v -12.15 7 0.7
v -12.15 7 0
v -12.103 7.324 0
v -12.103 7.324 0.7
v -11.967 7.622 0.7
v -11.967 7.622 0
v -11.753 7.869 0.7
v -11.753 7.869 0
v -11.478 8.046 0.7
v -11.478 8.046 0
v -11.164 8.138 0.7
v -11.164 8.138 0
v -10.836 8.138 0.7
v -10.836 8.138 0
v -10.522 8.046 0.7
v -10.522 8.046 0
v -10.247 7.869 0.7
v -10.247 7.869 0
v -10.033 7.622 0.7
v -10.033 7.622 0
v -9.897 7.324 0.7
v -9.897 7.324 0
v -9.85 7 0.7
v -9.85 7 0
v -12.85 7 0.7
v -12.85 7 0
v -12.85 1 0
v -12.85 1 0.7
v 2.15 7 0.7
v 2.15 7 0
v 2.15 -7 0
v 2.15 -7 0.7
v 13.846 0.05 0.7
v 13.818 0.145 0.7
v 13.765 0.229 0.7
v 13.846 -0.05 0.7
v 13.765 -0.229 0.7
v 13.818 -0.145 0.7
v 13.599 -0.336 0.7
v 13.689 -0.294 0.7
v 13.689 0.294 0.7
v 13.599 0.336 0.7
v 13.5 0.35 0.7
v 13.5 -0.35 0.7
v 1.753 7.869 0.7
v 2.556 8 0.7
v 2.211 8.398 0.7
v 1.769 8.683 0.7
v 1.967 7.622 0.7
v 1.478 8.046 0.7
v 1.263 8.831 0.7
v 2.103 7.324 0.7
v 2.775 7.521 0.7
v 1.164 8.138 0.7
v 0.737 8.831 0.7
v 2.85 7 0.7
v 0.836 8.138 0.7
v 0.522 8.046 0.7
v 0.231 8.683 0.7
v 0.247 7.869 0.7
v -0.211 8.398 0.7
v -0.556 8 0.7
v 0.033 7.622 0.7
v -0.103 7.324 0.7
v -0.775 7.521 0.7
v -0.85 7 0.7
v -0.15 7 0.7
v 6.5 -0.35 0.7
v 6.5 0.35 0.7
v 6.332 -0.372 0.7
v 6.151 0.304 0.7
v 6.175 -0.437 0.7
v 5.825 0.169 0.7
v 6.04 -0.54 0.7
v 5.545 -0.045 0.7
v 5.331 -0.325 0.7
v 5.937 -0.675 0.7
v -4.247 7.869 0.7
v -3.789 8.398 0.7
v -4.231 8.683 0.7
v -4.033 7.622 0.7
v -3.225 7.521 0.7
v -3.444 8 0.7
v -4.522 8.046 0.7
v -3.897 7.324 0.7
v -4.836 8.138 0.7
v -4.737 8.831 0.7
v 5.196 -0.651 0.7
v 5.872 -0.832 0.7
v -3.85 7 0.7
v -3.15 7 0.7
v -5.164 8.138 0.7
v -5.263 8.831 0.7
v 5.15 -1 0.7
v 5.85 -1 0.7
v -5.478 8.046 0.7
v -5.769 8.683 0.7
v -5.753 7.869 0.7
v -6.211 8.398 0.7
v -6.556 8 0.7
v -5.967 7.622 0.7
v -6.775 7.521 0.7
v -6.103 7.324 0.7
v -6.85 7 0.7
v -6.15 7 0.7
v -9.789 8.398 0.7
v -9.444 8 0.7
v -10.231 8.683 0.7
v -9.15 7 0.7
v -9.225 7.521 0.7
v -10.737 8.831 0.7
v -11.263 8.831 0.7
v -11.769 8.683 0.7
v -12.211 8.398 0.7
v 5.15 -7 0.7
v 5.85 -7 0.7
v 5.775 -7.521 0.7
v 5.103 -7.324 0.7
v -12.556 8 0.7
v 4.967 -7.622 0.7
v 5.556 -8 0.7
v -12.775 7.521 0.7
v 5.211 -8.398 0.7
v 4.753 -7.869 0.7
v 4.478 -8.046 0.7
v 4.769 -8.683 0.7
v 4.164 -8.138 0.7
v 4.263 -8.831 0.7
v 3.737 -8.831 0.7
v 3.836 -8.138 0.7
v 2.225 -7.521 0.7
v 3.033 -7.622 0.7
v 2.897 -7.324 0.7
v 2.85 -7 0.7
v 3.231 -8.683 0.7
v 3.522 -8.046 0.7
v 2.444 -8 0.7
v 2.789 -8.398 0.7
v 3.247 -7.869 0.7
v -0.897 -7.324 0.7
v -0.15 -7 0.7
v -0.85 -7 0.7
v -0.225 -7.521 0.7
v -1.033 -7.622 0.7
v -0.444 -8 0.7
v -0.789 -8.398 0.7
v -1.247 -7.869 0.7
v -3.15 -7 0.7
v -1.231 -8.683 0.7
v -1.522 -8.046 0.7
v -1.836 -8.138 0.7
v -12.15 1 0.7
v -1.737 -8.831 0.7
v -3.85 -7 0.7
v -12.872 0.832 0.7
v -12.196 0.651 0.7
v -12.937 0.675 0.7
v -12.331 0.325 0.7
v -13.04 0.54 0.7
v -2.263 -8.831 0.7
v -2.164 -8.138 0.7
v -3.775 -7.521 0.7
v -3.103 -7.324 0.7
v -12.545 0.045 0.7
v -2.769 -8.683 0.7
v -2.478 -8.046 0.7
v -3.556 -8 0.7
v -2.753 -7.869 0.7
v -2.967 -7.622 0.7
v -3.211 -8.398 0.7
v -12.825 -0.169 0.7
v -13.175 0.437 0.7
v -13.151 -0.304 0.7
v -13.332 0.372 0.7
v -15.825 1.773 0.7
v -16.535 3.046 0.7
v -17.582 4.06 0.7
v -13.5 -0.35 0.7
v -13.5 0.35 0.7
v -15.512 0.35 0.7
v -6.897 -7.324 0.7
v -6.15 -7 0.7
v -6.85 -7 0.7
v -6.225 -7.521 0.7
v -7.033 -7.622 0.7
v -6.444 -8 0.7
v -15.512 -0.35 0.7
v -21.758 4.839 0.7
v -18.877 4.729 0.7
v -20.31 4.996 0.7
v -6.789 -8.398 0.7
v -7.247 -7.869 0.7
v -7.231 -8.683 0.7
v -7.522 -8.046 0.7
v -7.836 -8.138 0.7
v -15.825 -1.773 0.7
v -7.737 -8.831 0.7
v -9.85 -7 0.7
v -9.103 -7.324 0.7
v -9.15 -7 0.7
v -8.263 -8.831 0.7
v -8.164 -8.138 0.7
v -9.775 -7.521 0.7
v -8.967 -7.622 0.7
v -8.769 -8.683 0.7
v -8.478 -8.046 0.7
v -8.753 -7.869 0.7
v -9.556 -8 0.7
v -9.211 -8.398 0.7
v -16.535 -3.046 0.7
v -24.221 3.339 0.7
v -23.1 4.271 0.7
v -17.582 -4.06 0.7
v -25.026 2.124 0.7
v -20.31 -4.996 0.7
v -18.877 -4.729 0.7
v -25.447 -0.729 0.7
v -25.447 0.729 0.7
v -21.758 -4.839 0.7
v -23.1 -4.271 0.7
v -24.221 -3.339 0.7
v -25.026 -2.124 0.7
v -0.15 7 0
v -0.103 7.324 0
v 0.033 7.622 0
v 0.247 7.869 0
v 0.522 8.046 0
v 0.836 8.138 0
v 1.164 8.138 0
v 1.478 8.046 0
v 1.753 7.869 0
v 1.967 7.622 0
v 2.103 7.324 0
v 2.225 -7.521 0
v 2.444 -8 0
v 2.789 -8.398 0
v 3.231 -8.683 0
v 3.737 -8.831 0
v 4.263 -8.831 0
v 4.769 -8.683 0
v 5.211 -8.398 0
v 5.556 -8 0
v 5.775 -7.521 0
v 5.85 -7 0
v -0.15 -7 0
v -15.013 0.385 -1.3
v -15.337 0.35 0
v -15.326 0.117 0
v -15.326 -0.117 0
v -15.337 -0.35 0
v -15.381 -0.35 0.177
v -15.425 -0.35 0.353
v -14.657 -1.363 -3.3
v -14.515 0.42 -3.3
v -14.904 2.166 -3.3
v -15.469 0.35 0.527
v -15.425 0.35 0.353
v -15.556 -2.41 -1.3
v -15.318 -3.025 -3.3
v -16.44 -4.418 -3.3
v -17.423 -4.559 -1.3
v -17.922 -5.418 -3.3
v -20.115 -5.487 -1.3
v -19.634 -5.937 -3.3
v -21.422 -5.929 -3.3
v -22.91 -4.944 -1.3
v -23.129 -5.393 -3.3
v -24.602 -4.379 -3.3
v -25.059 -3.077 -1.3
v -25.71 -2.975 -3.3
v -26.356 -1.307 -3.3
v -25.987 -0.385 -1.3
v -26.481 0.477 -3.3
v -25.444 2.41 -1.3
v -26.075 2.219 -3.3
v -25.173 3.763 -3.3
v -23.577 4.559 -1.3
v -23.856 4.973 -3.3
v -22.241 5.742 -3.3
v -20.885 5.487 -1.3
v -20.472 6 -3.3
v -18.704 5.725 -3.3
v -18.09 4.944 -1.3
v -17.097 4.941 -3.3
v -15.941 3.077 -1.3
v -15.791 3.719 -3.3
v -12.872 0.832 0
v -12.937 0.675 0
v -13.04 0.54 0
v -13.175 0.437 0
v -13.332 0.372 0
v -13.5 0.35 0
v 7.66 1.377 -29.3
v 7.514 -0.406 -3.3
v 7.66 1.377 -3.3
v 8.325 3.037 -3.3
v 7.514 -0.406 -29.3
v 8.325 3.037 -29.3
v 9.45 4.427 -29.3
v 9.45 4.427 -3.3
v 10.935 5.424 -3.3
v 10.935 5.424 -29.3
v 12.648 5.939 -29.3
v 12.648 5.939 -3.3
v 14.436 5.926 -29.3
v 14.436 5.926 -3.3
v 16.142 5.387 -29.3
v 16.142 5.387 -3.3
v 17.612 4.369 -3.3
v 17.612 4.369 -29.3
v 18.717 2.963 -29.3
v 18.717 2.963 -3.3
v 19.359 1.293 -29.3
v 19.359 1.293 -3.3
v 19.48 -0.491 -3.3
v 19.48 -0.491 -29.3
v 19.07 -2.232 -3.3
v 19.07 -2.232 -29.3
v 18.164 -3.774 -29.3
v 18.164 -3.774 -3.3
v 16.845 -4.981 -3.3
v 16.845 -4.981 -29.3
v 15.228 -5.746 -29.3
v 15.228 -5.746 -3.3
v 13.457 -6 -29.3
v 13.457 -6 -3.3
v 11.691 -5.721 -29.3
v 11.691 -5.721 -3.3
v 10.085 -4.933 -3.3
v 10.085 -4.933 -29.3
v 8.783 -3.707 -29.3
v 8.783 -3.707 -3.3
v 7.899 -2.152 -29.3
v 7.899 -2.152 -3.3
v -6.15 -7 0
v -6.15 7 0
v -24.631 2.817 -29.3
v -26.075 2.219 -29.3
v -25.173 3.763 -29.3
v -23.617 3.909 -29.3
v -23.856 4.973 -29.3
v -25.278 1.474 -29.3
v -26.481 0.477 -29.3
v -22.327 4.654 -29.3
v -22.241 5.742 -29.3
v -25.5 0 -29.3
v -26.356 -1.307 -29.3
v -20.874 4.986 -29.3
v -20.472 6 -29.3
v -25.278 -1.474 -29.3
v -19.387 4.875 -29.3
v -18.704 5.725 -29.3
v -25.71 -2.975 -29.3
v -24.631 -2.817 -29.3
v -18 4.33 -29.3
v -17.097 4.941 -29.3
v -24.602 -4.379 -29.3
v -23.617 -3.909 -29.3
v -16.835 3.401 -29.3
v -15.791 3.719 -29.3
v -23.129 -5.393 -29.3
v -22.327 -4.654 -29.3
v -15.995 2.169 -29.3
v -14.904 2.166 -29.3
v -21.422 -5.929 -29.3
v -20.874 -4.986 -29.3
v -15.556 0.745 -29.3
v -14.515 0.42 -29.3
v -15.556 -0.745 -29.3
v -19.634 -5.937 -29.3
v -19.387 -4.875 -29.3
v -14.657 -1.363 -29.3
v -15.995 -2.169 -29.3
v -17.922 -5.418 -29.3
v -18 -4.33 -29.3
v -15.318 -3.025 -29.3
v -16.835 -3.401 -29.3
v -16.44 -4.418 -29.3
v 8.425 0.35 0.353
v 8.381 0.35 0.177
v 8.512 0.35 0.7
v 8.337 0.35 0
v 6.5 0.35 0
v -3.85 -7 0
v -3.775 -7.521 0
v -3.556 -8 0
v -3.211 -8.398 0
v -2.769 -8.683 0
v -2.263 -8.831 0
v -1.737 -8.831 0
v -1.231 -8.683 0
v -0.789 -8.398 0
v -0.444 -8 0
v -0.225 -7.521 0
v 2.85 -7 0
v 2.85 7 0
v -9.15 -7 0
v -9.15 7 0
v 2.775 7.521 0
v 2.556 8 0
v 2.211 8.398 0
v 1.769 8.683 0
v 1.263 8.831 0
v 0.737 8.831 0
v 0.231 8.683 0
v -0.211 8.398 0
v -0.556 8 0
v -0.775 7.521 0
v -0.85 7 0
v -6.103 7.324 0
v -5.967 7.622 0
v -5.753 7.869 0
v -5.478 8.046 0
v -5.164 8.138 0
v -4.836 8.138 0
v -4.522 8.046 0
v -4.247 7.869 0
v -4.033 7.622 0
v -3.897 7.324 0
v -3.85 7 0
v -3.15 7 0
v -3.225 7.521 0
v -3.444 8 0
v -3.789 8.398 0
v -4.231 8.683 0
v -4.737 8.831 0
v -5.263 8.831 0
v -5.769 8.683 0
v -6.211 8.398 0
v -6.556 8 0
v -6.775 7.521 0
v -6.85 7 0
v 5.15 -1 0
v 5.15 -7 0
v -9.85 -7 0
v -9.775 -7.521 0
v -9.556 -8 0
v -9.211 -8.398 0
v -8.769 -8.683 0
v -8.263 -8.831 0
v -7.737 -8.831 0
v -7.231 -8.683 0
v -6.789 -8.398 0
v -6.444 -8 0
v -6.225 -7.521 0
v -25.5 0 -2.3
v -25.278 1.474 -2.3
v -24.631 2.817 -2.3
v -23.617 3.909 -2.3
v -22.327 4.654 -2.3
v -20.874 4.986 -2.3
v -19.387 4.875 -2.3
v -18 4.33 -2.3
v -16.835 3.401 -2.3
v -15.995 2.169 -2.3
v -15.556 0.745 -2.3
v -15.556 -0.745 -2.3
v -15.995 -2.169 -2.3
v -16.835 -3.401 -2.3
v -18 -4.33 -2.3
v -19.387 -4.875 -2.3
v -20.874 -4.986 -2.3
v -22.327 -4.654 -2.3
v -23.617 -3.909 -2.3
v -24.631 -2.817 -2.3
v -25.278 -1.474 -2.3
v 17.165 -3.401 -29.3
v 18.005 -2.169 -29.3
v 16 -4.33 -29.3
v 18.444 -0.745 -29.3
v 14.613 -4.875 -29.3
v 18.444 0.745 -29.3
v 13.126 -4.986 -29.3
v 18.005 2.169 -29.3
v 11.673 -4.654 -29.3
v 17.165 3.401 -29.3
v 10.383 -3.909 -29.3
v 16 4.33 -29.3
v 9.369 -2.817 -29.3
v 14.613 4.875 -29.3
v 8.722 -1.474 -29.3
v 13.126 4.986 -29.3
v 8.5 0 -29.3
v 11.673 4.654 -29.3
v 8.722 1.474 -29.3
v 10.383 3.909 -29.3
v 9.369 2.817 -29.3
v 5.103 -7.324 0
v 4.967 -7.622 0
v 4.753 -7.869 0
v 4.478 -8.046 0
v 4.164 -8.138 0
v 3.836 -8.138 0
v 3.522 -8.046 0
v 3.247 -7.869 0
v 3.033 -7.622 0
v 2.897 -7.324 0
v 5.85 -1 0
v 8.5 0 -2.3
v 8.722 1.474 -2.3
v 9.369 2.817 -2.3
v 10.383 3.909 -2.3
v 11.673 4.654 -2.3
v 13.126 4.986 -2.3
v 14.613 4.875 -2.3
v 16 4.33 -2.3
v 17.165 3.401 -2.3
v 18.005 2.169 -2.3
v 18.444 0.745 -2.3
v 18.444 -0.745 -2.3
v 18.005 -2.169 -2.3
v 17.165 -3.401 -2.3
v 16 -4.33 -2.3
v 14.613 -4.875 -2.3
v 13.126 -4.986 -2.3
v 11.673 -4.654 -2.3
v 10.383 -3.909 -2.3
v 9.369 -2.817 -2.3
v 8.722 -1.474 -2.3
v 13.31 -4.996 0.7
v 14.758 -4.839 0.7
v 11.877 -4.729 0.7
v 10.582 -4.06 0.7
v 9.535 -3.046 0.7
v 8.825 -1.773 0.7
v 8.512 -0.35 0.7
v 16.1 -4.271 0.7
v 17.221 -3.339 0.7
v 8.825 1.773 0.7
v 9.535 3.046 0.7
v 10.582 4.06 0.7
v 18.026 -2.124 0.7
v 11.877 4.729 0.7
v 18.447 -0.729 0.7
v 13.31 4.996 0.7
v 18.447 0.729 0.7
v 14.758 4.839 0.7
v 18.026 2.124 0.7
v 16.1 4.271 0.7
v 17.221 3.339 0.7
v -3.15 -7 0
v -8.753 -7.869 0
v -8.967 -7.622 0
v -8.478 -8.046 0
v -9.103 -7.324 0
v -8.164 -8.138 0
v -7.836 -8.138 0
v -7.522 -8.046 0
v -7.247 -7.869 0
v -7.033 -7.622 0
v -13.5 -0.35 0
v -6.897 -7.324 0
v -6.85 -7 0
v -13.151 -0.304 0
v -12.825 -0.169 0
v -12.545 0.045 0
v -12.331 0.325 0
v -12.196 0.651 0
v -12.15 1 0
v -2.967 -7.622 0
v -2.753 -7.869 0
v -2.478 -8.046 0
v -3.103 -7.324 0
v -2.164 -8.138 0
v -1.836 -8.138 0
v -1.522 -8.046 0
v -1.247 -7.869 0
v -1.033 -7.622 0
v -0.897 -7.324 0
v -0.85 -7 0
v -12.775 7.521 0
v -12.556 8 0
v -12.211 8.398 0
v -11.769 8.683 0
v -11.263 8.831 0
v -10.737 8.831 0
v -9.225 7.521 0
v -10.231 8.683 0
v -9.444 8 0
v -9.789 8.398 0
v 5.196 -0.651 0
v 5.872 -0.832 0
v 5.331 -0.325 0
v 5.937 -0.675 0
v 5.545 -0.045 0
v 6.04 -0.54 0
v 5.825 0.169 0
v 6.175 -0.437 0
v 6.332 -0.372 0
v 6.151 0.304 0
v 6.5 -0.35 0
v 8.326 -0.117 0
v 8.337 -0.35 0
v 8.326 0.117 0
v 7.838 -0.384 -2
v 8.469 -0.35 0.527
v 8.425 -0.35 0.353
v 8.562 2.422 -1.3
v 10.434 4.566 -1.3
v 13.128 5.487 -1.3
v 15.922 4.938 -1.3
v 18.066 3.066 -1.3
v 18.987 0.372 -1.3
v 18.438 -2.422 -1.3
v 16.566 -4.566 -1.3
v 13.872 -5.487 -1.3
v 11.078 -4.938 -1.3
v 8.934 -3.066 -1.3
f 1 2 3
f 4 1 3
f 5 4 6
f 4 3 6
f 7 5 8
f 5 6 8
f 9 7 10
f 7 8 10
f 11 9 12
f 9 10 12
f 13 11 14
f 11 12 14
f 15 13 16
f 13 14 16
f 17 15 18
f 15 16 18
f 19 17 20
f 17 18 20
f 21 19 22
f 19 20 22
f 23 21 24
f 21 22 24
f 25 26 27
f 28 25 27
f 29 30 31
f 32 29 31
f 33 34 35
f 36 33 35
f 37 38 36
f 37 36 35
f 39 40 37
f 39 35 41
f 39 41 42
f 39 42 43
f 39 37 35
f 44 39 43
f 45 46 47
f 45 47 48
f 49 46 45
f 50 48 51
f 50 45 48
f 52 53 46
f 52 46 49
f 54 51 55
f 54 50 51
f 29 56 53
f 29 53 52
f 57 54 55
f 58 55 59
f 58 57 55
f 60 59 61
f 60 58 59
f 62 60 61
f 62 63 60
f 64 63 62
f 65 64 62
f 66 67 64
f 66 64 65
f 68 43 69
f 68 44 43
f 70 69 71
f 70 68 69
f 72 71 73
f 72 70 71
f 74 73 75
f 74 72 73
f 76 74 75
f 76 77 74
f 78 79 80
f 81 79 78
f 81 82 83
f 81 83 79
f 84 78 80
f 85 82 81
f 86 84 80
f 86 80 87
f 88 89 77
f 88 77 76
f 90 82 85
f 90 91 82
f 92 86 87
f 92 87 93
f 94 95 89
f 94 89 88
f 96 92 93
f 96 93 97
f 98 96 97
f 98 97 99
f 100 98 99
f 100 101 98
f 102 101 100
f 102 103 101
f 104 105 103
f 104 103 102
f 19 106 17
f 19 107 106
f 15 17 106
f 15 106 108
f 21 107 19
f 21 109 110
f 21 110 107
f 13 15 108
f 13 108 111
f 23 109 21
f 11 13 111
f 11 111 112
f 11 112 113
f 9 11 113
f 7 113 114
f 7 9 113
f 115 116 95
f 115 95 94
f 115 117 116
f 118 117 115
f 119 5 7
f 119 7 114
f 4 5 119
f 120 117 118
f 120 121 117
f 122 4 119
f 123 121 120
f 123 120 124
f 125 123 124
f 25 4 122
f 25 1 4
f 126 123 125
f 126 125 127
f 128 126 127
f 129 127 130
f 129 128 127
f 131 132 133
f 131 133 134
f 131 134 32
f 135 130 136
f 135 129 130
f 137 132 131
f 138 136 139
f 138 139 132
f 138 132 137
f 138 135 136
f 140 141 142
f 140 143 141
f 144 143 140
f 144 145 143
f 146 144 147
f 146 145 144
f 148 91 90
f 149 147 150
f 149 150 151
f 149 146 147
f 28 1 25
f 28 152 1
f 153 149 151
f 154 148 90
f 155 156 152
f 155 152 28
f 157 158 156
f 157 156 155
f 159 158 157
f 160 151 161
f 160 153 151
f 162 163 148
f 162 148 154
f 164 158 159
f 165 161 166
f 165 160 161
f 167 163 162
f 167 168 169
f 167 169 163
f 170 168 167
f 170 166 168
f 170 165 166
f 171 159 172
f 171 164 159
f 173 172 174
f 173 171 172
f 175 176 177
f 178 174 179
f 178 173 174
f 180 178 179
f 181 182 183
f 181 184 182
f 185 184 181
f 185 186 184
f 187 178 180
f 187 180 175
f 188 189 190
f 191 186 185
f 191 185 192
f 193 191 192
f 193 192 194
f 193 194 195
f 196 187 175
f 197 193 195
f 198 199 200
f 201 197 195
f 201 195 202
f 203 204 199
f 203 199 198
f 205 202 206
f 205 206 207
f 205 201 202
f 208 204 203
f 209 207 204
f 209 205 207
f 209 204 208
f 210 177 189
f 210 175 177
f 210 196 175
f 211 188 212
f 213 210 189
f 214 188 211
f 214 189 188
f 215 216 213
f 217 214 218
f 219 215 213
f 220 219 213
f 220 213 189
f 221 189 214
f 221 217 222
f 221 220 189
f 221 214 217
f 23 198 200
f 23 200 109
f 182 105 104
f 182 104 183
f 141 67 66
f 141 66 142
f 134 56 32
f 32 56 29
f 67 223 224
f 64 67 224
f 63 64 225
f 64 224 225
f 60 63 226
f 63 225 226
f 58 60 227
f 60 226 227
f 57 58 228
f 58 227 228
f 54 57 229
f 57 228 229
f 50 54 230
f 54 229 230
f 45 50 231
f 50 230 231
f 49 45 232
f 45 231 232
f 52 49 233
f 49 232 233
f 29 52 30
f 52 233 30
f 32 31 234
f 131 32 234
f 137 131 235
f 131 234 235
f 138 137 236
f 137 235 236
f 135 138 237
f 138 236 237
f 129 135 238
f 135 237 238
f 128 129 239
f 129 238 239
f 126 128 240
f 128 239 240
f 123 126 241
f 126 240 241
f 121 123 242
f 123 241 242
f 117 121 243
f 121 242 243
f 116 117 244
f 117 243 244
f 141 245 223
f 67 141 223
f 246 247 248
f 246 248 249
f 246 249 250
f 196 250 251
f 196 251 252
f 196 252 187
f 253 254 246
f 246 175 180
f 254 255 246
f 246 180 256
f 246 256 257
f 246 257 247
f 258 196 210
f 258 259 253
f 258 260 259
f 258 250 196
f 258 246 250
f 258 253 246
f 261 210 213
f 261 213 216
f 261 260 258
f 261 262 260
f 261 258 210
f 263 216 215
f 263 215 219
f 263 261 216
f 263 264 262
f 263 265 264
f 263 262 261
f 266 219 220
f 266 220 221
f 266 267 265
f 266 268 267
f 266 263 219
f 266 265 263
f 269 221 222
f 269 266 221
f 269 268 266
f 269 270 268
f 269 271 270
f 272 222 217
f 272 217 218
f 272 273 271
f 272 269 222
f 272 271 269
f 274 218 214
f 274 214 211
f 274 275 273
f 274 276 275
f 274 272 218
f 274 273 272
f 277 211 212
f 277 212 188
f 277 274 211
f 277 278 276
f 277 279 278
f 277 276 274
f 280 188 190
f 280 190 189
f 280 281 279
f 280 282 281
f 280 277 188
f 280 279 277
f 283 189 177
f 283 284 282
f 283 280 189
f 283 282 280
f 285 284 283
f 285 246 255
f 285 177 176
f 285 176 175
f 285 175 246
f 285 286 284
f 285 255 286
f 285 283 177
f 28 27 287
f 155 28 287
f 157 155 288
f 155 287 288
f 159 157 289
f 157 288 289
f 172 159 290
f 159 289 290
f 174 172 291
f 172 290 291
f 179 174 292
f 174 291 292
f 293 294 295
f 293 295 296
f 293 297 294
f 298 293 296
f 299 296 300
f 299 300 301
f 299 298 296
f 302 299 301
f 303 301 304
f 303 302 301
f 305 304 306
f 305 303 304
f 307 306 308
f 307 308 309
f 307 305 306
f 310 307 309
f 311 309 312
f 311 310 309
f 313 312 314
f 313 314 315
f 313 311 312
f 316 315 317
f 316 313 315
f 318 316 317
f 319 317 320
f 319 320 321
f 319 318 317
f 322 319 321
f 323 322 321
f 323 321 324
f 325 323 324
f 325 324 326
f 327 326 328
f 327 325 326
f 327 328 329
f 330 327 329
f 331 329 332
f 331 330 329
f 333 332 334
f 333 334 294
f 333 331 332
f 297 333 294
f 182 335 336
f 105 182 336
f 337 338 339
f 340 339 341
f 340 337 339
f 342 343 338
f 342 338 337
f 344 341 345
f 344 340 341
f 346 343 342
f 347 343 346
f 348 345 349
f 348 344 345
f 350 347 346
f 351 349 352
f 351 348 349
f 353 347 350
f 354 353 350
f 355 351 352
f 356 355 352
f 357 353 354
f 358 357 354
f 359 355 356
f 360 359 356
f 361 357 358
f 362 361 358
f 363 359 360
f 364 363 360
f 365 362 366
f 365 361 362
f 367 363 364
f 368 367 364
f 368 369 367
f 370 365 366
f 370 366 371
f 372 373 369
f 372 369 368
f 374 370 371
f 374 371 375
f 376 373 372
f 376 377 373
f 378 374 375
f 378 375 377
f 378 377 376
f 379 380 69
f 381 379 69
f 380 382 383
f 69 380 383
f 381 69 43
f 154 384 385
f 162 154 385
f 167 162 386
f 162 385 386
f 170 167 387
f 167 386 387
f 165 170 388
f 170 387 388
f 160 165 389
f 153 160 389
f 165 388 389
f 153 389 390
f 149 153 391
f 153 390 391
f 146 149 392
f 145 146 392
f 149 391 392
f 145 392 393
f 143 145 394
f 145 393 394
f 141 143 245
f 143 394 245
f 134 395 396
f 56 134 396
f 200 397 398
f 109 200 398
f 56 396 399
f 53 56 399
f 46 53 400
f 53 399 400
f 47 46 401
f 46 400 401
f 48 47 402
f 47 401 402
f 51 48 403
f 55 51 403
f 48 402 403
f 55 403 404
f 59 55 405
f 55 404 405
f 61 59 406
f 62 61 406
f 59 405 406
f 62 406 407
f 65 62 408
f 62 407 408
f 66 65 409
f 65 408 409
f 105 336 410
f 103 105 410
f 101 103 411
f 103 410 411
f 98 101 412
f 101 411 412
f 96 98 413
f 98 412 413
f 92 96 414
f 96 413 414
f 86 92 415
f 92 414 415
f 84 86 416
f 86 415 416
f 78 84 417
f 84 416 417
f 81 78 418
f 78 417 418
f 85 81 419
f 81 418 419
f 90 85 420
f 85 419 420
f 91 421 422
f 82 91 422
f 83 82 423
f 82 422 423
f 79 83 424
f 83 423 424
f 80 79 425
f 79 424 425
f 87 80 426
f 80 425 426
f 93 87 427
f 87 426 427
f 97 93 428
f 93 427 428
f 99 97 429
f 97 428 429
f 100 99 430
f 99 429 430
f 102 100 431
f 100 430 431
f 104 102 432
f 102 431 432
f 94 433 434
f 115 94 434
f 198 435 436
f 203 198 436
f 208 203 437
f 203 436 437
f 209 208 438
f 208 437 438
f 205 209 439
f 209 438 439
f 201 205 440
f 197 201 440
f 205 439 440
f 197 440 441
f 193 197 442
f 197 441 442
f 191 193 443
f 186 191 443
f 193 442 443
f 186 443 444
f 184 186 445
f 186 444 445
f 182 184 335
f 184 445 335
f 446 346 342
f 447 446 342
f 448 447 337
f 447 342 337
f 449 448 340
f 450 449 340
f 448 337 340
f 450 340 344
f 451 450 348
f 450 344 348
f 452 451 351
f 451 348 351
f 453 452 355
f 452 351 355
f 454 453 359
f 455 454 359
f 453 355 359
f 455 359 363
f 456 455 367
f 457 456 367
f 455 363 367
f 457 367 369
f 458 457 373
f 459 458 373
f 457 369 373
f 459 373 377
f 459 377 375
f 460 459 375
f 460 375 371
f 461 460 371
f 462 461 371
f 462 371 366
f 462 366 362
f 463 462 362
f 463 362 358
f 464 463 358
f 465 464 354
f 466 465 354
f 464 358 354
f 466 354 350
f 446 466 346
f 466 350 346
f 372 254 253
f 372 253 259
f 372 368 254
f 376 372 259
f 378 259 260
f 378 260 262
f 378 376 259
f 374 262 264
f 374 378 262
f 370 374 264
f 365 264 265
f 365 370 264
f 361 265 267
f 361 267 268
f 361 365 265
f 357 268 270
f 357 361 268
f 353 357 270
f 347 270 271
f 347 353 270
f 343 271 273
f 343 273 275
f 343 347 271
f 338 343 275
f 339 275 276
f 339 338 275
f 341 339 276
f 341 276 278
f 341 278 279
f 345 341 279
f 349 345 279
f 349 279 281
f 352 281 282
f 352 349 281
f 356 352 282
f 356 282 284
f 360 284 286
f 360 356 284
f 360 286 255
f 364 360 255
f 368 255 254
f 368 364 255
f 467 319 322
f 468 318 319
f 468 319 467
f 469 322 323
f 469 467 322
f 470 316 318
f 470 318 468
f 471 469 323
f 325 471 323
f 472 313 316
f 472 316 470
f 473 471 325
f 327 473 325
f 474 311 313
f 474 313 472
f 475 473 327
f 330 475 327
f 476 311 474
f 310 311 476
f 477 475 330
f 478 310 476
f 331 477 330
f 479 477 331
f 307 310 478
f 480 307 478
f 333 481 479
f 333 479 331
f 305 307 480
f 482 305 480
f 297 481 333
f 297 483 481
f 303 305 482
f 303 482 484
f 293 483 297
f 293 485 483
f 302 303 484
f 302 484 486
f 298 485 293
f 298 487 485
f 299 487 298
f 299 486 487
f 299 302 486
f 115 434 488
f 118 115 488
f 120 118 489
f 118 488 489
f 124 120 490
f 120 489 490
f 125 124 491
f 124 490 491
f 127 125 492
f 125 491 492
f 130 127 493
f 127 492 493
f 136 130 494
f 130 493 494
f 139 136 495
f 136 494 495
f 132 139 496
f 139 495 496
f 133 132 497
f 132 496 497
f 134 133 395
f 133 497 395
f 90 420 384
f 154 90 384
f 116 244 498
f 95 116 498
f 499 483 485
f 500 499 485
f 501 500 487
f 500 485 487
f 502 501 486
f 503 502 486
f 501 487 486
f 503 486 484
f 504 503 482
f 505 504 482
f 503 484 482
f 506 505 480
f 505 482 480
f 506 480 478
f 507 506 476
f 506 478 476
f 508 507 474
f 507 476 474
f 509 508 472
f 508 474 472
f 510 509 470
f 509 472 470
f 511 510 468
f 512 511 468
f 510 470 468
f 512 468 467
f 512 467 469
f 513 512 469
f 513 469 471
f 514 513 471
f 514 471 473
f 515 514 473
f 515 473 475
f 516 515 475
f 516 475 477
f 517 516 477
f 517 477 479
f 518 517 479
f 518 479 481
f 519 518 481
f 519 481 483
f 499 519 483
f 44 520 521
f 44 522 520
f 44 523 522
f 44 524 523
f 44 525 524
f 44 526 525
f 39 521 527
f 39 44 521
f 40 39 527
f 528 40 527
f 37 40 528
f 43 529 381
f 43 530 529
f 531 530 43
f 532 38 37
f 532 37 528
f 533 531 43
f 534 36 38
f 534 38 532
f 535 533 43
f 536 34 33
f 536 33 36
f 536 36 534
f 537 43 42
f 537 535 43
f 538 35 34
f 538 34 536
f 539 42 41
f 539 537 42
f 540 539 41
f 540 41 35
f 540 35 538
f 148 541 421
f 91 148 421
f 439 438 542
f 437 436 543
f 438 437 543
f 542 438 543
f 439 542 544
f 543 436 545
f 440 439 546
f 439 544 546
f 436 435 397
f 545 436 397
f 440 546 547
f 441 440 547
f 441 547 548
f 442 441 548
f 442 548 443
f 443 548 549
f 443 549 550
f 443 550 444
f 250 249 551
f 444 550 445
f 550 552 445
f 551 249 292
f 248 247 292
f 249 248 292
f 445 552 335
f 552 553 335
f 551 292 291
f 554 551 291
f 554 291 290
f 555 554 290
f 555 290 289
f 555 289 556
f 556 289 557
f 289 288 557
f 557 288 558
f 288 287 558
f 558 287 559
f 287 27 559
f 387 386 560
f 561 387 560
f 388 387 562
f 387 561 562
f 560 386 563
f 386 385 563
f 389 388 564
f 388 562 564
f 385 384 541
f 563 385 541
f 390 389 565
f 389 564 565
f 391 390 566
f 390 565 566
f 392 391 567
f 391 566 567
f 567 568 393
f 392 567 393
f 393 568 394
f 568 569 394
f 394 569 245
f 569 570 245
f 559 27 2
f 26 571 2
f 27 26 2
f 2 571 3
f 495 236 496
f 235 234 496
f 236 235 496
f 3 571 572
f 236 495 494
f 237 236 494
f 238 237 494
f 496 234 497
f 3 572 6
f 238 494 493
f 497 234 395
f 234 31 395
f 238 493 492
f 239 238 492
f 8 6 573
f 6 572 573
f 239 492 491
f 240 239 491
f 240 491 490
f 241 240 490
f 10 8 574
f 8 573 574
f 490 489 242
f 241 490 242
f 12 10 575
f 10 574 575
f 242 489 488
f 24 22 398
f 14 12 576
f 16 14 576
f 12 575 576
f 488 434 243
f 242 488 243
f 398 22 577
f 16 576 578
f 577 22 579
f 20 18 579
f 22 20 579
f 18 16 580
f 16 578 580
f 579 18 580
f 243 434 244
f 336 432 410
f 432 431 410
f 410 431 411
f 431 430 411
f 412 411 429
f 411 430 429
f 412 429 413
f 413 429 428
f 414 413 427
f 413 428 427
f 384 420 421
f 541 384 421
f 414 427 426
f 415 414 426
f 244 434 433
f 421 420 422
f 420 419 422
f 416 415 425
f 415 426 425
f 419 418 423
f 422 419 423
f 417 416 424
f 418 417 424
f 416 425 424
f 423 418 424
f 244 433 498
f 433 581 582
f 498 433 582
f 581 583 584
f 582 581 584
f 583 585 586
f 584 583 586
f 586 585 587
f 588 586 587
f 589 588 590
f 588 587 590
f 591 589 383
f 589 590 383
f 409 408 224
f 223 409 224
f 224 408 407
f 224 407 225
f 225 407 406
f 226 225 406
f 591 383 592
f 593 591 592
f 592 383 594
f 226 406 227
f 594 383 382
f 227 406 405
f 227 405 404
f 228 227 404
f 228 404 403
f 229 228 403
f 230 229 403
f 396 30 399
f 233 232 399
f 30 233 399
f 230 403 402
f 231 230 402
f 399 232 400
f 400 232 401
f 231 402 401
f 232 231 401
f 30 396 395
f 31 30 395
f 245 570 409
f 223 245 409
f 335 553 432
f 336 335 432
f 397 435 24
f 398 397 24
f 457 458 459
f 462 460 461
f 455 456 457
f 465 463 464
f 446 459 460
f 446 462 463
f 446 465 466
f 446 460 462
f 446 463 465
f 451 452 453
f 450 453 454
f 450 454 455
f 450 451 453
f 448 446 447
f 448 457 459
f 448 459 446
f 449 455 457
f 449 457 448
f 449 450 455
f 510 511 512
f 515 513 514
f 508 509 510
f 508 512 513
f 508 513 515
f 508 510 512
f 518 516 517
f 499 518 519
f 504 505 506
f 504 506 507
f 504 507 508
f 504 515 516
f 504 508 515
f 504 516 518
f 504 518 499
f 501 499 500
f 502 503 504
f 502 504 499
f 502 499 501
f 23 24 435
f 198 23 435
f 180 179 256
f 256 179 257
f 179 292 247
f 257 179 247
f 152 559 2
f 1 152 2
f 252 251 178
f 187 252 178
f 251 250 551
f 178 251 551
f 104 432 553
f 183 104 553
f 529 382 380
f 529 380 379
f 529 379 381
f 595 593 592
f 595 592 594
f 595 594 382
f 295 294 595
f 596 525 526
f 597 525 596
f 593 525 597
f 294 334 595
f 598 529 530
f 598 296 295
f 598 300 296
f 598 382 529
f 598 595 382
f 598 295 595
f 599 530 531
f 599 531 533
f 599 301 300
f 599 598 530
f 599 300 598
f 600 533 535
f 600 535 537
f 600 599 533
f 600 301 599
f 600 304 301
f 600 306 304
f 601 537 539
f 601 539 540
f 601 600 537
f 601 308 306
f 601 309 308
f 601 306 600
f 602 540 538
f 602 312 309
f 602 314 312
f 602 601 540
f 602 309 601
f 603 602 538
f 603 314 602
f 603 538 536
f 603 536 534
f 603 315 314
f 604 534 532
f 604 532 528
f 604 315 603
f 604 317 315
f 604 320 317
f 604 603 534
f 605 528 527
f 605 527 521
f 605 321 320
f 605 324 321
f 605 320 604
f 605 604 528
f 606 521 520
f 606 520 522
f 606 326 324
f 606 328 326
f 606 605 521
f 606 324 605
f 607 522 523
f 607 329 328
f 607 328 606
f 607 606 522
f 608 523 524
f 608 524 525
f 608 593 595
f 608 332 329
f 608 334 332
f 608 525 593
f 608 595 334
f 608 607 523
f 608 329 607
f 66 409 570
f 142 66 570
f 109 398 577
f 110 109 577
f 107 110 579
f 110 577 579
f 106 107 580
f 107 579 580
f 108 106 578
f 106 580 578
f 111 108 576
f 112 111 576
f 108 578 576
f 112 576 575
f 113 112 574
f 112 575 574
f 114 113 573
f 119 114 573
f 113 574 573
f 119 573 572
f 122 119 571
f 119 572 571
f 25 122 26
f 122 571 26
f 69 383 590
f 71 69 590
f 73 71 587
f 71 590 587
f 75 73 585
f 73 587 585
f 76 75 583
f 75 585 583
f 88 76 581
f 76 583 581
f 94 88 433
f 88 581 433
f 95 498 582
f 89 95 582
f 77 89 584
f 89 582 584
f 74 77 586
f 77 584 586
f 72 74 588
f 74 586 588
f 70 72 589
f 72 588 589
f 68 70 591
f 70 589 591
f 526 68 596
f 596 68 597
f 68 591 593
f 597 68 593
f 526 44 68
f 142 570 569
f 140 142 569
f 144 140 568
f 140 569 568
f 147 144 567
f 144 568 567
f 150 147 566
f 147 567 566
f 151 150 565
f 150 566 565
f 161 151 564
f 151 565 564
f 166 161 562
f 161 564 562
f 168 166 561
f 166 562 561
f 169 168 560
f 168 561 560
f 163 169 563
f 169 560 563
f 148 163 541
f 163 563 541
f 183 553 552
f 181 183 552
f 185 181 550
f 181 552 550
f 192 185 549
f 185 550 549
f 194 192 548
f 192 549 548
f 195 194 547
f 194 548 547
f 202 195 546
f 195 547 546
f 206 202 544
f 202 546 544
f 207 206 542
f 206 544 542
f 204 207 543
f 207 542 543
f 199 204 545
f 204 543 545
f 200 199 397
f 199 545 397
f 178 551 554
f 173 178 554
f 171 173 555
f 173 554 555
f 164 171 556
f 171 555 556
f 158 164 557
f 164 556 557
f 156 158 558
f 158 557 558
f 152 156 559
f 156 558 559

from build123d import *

# Parameters (mm, degrees)
BOSS_EXTRUDE1_DEPTH = 0.7
SKETCH5_R           = 5
CUT_EXTRUDE1_DEPTH  = 27
SKETCH6_R           = 5
CUT_EXTRUDE2_DEPTH  = 27


with BuildPart() as part:
    # Sketch2 → Boss-Extrude1 (new body)
    with BuildSketch(Plane.XY):
        with BuildLine():
            Line((-20.5, -0.35), (-13.5, -0.35))
            ThreePointArc((-13.5, -0.35), (-12.545405845, 0.045405845), (-12.15, 1))
            Line((-12.15, 1), (-12.15, 7))
            ThreePointArc((-12.15, 7), (-11, 8.15), (-9.85, 7))
            Line((-9.85, 7), (-9.85, 0))
            Line((-9.85, 0), (-9.85, -7))
            ThreePointArc((-9.85, -7), (-8, -8.85), (-6.15, -7))
            Line((-6.15, -7), (-6.15, 0))
            Line((-6.15, 0), (-6.15, 7))
            ThreePointArc((-6.15, 7), (-5, 8.15), (-3.85, 7))
            Line((-3.85, 7), (-3.85, 0))
            Line((-3.85, 0), (-3.85, -7))
            ThreePointArc((-3.85, -7), (-2, -8.85), (-0.15, -7))
            Line((-0.15, -7), (-0.15, 0))
            Line((-0.15, 0), (-0.15, 7))
            ThreePointArc((-0.15, 7), (1, 8.15), (2.15, 7))
            Line((2.15, 7), (2.15, 0))
            Line((2.15, 0), (2.15, -7))
            ThreePointArc((2.15, -7), (4, -8.85), (5.85, -7))
            Line((5.85, -7), (5.85, -1))
            ThreePointArc((5.85, -1), (6.040380592, -0.540380592), (6.5, -0.35))
            Line((6.5, -0.35), (13.5, -0.35))
            ThreePointArc((13.5, -0.35), (13.85, 0), (13.5, 0.35))
            Line((13.5, 0.35), (6.5, 0.35))
            ThreePointArc((6.5, 0.35), (5.545405845, -0.045405845), (5.15, -1))
            Line((5.15, -1), (5.15, -7))
            ThreePointArc((5.15, -7), (4, -8.15), (2.85, -7))
            Line((2.85, -7), (2.85, 0))
            Line((2.85, 0), (2.85, 7))
            ThreePointArc((2.85, 7), (1, 8.85), (-0.85, 7))
            Line((-0.85, 7), (-0.85, 0))
            Line((-0.85, 0), (-0.85, -7))
            ThreePointArc((-0.85, -7), (-2, -8.15), (-3.15, -7))
            Line((-3.15, -7), (-3.15, 0))
            Line((-3.15, 0), (-3.15, 7))
            ThreePointArc((-3.15, 7), (-5, 8.85), (-6.85, 7))
            Line((-6.85, 7), (-6.85, 0))
            Line((-6.85, 0), (-6.85, -7))
            ThreePointArc((-6.85, -7), (-8, -8.15), (-9.15, -7))
            Line((-9.15, -7), (-9.15, 0))
            Line((-9.15, 0), (-9.15, 7))
            ThreePointArc((-9.15, 7), (-11, 8.85), (-12.85, 7))
            Line((-12.85, 7), (-12.85, 1))
            ThreePointArc((-12.85, 1), (-13.040380592, 0.540380592), (-13.5, 0.35))
            Line((-13.5, 0.35), (-20.5, 0.35))
            ThreePointArc((-20.5, 0.35), (-20.85, 0), (-20.5, -0.35))
        make_face()
    extrude(amount=BOSS_EXTRUDE1_DEPTH)

    # Sketch3 → Revolve1 (revolve)
    with BuildSketch(Plane(origin=(0, 0, 0), x_dir=(1, 0, 0), z_dir=(0, 1, 0)), mode=Mode.PRIVATE) as revolve1_sk:
        Polygon((-20.5, -0.7), (-25.5, -0.7), (-26.5, 3.3), (-26.5, 29.3), (-20.5, 29.3), align=None)
    revolve(revolve1_sk.sketch.rotate(Axis((-20.5, 0, 0.7), (0, 0, -1)), 175.986012782), axis=Axis((-20.5, 0, 0.7), (0, 0, -1)))

    # Sketch4 → Revolve2 (revolve)
    with BuildSketch(Plane(origin=(0, 0, 0), x_dir=(1, 0, 0), z_dir=(0, 1, 0)), mode=Mode.PRIVATE) as revolve2_sk:
        Polygon((13.5, -0.69956823), (18.5, -0.69956823), (19.5, 3.30043177), (19.5, 29.30043177), (13.5, 29.30043177), align=None)
    revolve(revolve2_sk.sketch.rotate(Axis((13.5, 0, 0.69956823), (0, 0, -1)), 176.121883858), axis=Axis((13.5, 0, 0.69956823), (0, 0, -1)))

    # Sketch5 → Cut-Extrude1 (cut)
    with BuildSketch(Plane(origin=(0, 0, -29.3), x_dir=(-1, 0, 0), z_dir=(0, 0, -1))):
        with Locations((-13.5, 0)):
            Circle(SKETCH5_R)
        with Locations((20.5, 0)):
            Circle(SKETCH5_R)
    extrude(amount=-CUT_EXTRUDE1_DEPTH, mode=Mode.SUBTRACT)

    # Sketch6 → Cut-Extrude2 (cut)
    with BuildSketch(Plane(origin=(0, 0, -29.30043177), x_dir=(-1, 0, 0), z_dir=(0, 0, -1))):
        with Locations((-13.5, 0)):
            Circle(SKETCH6_R)
    extrude(amount=-CUT_EXTRUDE2_DEPTH, mode=Mode.SUBTRACT)


solid = part.part
